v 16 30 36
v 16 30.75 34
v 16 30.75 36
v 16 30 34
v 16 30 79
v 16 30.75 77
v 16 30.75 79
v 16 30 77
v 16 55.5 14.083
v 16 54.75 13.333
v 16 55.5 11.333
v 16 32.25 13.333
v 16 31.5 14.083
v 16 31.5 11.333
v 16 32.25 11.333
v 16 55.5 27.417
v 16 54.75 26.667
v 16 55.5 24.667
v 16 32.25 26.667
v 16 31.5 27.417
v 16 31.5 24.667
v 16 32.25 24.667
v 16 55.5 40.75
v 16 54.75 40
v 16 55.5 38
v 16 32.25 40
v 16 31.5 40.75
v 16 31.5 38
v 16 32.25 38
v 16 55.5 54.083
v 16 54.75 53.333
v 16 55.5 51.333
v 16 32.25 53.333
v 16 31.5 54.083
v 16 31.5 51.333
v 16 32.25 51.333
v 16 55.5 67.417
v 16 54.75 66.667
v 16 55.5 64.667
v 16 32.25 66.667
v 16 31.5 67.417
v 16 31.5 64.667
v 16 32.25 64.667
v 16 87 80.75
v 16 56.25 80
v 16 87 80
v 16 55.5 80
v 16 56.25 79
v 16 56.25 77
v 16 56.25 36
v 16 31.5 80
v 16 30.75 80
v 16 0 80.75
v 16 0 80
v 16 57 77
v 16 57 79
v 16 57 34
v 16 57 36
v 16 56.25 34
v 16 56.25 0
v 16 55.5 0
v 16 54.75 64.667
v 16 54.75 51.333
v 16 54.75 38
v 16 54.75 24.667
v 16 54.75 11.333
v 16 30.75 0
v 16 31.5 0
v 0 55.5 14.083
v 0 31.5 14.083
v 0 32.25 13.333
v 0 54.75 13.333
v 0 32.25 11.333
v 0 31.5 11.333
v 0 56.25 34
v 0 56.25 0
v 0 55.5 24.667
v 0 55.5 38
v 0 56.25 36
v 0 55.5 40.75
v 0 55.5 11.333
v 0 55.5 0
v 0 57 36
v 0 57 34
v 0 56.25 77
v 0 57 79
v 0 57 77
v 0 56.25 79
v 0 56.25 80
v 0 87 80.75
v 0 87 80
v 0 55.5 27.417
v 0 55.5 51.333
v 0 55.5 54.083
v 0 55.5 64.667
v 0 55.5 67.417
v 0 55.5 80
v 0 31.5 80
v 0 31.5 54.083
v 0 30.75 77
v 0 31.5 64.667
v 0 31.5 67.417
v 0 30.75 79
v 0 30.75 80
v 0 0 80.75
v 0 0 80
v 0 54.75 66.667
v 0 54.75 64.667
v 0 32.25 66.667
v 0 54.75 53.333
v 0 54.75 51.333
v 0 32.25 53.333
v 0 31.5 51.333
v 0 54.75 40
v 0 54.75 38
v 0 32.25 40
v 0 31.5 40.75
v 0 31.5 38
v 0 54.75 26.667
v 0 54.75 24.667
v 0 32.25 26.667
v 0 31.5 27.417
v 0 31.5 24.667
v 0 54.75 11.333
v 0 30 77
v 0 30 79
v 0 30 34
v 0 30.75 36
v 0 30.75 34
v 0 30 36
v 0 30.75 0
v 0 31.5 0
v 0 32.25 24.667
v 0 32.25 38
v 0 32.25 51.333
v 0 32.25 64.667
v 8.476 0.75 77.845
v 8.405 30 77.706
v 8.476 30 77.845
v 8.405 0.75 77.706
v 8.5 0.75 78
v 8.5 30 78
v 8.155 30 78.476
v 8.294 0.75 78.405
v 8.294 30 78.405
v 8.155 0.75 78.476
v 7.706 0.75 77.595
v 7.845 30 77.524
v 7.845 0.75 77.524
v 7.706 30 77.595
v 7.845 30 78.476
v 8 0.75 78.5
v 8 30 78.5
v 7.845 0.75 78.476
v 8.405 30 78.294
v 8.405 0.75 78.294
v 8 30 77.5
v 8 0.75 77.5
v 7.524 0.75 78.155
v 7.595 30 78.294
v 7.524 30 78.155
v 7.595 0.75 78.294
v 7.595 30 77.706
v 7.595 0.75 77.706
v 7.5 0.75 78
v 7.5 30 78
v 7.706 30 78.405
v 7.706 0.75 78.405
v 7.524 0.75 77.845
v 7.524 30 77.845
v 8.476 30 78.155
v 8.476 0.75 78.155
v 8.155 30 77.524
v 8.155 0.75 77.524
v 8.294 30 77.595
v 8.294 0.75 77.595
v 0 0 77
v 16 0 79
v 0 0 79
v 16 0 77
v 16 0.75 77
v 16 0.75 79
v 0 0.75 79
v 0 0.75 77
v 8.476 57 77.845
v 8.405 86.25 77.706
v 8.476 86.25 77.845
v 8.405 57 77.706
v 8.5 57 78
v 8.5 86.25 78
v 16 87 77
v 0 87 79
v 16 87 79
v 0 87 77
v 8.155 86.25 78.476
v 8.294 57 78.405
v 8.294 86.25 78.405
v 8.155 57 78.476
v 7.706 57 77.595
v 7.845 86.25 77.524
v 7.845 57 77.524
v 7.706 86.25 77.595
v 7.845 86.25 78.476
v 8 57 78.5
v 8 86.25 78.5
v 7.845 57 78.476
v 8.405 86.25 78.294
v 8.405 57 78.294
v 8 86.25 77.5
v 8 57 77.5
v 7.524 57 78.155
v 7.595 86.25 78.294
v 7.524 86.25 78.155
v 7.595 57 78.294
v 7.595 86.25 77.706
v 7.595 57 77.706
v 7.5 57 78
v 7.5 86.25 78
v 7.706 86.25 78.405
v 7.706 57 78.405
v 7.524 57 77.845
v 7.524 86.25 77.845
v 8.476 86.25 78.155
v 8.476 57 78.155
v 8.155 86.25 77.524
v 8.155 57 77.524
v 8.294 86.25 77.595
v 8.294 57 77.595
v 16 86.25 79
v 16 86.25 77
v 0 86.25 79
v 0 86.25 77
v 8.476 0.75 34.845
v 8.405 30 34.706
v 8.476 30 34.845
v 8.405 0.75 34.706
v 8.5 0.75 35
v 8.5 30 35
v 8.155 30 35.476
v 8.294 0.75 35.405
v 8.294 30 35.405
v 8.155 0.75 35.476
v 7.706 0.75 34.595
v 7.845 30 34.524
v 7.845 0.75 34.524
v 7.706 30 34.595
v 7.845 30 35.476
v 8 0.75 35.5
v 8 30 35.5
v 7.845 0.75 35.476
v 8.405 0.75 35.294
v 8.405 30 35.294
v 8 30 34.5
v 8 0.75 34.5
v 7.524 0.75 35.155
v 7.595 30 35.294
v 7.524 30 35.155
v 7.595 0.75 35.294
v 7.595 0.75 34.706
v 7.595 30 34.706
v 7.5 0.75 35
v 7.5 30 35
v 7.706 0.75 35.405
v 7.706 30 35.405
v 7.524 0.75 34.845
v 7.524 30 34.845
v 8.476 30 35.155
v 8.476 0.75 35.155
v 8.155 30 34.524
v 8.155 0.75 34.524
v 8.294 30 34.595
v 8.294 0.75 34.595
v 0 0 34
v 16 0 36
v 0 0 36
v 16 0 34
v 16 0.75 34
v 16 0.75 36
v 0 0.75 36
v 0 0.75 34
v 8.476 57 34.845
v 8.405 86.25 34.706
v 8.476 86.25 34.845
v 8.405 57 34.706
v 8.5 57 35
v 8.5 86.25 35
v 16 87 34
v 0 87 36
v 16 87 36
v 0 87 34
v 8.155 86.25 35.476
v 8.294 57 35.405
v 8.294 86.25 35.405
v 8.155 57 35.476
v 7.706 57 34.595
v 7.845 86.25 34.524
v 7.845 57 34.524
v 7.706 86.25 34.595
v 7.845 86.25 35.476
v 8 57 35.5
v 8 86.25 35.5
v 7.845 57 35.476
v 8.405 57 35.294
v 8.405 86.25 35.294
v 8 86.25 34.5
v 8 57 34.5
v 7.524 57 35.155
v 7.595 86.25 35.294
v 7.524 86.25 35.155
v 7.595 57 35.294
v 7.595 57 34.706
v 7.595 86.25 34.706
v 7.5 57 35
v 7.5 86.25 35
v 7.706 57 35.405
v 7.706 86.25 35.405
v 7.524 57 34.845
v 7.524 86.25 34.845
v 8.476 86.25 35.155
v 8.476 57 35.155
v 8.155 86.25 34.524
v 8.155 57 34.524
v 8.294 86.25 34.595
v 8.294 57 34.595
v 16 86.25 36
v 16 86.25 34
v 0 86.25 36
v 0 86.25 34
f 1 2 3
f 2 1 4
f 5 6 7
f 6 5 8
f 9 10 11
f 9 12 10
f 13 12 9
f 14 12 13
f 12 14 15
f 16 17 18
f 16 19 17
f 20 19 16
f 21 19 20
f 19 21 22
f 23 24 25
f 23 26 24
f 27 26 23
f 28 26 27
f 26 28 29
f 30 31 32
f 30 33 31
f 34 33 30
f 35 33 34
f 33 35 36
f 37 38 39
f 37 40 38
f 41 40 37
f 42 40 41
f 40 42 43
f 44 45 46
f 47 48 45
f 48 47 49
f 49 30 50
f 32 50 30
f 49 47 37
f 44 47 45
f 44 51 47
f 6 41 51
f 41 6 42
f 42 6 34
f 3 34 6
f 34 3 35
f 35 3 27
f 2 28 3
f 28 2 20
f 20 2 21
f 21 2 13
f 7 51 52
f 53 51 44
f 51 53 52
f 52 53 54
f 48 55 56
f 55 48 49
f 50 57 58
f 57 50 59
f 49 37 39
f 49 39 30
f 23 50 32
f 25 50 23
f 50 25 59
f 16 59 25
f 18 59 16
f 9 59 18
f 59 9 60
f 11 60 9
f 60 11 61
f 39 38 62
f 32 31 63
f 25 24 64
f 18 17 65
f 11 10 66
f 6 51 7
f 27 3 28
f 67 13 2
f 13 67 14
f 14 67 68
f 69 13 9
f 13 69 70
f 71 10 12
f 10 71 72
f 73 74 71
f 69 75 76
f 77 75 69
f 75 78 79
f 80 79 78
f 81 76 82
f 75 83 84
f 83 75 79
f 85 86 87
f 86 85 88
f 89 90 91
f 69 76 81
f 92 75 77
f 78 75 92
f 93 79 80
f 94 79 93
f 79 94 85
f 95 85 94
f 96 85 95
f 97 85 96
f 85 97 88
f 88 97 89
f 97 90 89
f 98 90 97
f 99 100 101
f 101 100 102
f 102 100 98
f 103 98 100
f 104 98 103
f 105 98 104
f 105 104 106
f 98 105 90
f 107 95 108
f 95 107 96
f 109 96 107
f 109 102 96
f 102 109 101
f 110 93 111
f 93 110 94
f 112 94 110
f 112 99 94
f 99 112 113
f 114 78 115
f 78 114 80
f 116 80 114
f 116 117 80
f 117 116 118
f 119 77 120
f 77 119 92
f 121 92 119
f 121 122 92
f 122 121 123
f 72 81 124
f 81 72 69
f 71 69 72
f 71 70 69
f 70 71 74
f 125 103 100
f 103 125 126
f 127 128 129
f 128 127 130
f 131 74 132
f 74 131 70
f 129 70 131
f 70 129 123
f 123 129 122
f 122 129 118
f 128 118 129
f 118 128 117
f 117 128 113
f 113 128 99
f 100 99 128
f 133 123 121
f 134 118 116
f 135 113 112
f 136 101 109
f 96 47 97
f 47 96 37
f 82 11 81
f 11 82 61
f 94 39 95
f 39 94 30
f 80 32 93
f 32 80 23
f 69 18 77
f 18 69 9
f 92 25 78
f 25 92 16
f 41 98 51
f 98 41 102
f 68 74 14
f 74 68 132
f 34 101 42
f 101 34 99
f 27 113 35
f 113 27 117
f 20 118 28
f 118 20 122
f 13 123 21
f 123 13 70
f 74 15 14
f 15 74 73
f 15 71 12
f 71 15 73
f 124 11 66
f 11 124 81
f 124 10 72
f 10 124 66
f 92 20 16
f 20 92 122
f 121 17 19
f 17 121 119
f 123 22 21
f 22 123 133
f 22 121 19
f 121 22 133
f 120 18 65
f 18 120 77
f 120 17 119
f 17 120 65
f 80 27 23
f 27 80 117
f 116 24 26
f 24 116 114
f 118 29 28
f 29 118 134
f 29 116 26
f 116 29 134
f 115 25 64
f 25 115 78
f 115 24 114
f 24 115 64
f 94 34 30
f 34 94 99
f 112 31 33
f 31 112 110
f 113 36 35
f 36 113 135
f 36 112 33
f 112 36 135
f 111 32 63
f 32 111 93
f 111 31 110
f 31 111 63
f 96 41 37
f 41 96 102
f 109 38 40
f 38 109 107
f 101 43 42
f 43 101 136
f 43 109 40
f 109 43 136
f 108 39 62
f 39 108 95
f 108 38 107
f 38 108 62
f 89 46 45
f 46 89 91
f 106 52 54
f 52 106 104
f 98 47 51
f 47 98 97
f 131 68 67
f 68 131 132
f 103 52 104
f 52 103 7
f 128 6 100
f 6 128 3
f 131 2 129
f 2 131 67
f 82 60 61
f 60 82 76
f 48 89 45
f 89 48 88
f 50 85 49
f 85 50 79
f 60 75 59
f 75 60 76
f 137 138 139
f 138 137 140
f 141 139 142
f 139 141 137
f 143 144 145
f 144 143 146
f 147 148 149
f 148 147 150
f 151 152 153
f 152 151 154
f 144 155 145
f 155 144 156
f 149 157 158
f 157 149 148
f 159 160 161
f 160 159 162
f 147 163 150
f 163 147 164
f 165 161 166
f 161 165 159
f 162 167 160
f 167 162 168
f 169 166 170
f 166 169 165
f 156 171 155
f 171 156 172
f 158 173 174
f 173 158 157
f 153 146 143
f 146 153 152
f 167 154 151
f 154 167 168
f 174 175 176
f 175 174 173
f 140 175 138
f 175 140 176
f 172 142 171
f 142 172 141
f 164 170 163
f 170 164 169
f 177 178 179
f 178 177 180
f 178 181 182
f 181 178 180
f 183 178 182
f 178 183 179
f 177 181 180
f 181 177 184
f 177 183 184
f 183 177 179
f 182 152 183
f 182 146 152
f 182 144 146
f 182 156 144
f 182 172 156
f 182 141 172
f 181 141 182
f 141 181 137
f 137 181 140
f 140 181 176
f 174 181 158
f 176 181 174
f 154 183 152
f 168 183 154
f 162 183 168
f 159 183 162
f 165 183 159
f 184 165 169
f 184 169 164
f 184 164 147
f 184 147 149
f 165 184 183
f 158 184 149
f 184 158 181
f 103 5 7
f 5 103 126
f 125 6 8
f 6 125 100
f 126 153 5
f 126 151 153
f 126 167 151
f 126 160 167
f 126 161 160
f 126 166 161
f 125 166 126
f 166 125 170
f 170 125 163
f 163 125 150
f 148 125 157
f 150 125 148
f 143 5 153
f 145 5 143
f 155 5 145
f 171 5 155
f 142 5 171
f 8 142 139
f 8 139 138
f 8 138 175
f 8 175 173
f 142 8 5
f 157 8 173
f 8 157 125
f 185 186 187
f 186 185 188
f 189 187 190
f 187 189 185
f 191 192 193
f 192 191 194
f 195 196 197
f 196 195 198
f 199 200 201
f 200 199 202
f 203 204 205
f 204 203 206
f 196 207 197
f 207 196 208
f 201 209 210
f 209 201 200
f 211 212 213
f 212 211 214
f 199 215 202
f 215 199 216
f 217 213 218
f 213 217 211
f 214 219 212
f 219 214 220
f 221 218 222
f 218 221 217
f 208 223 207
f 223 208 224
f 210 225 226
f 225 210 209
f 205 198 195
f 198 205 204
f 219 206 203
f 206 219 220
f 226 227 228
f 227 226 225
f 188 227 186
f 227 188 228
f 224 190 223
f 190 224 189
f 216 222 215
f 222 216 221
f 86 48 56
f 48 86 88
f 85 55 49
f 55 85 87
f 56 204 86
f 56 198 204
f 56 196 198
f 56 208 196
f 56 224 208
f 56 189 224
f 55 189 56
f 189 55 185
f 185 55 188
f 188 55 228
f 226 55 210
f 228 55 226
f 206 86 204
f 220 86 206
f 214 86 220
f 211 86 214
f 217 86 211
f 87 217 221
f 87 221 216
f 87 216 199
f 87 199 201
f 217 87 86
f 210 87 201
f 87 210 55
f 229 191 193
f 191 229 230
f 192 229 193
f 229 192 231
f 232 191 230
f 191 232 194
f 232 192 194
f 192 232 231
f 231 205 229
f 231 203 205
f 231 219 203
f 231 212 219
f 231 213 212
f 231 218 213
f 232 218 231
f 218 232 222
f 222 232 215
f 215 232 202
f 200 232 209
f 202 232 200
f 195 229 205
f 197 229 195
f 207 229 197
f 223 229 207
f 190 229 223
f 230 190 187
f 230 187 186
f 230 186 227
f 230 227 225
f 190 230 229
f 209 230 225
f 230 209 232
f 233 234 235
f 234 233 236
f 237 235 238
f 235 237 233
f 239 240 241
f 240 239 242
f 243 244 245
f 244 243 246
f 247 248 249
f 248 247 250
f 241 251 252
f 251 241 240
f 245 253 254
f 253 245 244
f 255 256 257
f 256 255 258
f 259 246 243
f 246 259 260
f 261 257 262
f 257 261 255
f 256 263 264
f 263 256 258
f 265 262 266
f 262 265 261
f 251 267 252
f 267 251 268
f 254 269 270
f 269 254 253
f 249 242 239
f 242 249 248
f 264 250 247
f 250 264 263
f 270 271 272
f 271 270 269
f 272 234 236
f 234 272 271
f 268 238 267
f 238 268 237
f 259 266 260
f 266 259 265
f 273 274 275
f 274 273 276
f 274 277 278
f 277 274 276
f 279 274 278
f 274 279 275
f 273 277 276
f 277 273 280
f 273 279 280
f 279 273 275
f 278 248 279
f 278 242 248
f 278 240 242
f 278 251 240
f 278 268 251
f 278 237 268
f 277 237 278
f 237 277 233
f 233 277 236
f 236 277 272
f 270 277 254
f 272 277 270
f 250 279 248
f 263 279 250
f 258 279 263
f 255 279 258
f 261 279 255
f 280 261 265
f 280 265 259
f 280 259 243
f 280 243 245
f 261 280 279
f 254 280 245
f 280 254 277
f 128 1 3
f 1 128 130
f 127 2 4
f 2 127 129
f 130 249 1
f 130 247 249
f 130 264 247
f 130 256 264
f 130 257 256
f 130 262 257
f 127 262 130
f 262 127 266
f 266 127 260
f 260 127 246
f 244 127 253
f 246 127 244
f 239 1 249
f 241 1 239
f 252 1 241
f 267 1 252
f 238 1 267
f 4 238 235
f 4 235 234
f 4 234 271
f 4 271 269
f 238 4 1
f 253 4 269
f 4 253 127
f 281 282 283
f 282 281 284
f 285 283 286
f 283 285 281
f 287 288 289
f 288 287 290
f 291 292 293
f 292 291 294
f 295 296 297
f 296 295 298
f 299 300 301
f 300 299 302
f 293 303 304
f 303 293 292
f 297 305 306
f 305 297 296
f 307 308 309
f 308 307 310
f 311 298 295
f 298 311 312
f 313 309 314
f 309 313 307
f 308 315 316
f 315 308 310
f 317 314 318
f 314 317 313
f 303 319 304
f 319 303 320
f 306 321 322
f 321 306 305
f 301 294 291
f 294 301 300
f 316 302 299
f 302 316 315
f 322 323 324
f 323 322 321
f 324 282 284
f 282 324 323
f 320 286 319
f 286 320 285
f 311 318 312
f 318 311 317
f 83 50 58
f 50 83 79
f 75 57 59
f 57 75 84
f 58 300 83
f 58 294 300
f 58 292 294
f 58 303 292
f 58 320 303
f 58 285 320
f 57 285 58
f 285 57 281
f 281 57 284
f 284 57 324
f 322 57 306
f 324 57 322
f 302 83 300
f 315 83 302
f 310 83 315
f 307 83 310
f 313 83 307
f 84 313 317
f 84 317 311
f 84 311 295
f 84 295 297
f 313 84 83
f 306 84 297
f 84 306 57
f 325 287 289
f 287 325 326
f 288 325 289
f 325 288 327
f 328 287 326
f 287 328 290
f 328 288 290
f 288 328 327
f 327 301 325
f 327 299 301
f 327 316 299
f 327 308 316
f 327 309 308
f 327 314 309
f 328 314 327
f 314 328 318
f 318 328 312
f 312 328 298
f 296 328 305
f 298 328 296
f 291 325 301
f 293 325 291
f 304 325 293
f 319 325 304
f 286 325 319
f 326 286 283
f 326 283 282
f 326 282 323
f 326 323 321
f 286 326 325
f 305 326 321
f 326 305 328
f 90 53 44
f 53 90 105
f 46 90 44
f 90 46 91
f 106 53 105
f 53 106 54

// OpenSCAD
// file: rod.scad
include <closet_space.scad>

rod_diameter=1;
units=" inches ";

module rod(length=24)
{
  translate([0.5*sh_depth,0,0]) rotate([-90,0,0]) cylinder(d=rod_diameter,h=length, $fn=20);
  echo(str("Rod: ",rod_diameter,units,"x ",length,units));
  // Brackets
  translate([0,0,-sh_brkt_height/2]) cube([sh_depth,sh_width,sh_brkt_height]);
  echo(str("Rod bracket: ",sh_depth,units,"x ",sh_brkt_height,units,"x ",sh_width, units));
  translate([0,length-sh_width,-sh_brkt_height/2]) cube([sh_depth,sh_width,sh_brkt_height]);
  echo(str("Rod bracket: ",sh_depth,units,"x ",sh_brkt_height,units,"x ",sh_width, units));
};
// file: shelf.scad
include <closet_space.scad>

sh_tot_height=80;
sh_width=0.75;
sh_depth=16;
sh_length=24;
sh_brkt_height=2;
units=" inches ";


module shelf (depth=sh_depth,width=sh_width,length=sh_length,height=0)
{
  translate([0,0,height]) 
  union(){
    cube([depth,length,width]);
    echo(str("Shelf: ",depth,units,"x ",length,units,"x ", width, units));
    translate([0,0,-sh_brkt_height]) cube([depth,width,sh_brkt_height]);
    echo(str("Shelf bracket: ",depth,units,"x ",sh_brkt_height,units,"x ", width, units));
    translate([0,length-width,-sh_brkt_height]) cube([depth,width,sh_brkt_height]);
    echo(str("Shelf bracket: ",depth,units,"x ",sh_brkt_height,units,"x ", width, units));
  };
};


module shelves ()
{
  num_shelves=5;
  //Individual shelves
  for( i = [1:(num_shelves)] )
  {
    shelf(height = i*sh_tot_height/(num_shelves+1));
    // Brackets
  }
  // Upright
  translate([0,-sh_width,0]) cube([sh_depth,sh_width,sh_tot_height]);
  echo(str("Shelf upright: ",sh_depth,units,"x ",sh_tot_height,units,"x ", sh_width, units));
  translate([0,sh_length,0]) cube([sh_depth,sh_width,sh_tot_height]);
  echo(str("Shelf upright: ",sh_depth,units,"x ",sh_tot_height,units,"x ", sh_width, units));

};

module top_shelf()
{
  translate([0,0,sh_tot_height]) cube([sh_depth, cl_rct_ln, sh_width]);
  echo(str("Top shelf: ",sh_depth,units,"x ",cl_rct_ln,units,"x ", sh_width, units));
};
// file: closet_space.scad
// Define the Space
cl_ht=95;
cl_rct_ln=87;
cl_dpth=23;
cl_tr_ht=8;

door_ht=80;
door_ln=58.75;
door_wdth=5;


// floor is a triangle plus a rectangle

module closet_space(){

union(){
  cube([cl_dpth,cl_rct_ln,cl_ht]);
  linear_extrude(height = cl_ht) polygon([[0,0], [cl_dpth,0], [cl_dpth/3,-cl_tr_ht]]);
  translate([cl_dpth,16,0]) cube([door_wdth,door_ln,door_ht]);
};
};
// main file
include <closet_space.scad>
include <shelf.scad>
include <rod.scad>

//% closet_space();

minimum_pants_length=35;
rod_length=(cl_rct_ln-sh_length-2*sh_width)/2;

translate([0,cl_rct_ln/2-sh_length/2,0]) shelves();
top_shelf();
translate([0,0,sh_tot_height-2]) rod(length=rod_length);
translate([0,rod_length+sh_length+2*sh_width,sh_tot_height-2]) rod(length=rod_length);
translate([0,0,minimum_pants_length]) rod(length=rod_length);
translate([0,rod_length+sh_length+2*sh_width,minimum_pants_length]) rod(length=rod_length);
//translate([0,24+sh_length+sh_width,33]) rod(length=cl_rct_ln-(24+sh_length+sh_width));
//translate([0,24+sh_length+sh_width,sh_tot_height-4]) rod(length=cl_rct_ln-(24+sh_length+sh_width));
